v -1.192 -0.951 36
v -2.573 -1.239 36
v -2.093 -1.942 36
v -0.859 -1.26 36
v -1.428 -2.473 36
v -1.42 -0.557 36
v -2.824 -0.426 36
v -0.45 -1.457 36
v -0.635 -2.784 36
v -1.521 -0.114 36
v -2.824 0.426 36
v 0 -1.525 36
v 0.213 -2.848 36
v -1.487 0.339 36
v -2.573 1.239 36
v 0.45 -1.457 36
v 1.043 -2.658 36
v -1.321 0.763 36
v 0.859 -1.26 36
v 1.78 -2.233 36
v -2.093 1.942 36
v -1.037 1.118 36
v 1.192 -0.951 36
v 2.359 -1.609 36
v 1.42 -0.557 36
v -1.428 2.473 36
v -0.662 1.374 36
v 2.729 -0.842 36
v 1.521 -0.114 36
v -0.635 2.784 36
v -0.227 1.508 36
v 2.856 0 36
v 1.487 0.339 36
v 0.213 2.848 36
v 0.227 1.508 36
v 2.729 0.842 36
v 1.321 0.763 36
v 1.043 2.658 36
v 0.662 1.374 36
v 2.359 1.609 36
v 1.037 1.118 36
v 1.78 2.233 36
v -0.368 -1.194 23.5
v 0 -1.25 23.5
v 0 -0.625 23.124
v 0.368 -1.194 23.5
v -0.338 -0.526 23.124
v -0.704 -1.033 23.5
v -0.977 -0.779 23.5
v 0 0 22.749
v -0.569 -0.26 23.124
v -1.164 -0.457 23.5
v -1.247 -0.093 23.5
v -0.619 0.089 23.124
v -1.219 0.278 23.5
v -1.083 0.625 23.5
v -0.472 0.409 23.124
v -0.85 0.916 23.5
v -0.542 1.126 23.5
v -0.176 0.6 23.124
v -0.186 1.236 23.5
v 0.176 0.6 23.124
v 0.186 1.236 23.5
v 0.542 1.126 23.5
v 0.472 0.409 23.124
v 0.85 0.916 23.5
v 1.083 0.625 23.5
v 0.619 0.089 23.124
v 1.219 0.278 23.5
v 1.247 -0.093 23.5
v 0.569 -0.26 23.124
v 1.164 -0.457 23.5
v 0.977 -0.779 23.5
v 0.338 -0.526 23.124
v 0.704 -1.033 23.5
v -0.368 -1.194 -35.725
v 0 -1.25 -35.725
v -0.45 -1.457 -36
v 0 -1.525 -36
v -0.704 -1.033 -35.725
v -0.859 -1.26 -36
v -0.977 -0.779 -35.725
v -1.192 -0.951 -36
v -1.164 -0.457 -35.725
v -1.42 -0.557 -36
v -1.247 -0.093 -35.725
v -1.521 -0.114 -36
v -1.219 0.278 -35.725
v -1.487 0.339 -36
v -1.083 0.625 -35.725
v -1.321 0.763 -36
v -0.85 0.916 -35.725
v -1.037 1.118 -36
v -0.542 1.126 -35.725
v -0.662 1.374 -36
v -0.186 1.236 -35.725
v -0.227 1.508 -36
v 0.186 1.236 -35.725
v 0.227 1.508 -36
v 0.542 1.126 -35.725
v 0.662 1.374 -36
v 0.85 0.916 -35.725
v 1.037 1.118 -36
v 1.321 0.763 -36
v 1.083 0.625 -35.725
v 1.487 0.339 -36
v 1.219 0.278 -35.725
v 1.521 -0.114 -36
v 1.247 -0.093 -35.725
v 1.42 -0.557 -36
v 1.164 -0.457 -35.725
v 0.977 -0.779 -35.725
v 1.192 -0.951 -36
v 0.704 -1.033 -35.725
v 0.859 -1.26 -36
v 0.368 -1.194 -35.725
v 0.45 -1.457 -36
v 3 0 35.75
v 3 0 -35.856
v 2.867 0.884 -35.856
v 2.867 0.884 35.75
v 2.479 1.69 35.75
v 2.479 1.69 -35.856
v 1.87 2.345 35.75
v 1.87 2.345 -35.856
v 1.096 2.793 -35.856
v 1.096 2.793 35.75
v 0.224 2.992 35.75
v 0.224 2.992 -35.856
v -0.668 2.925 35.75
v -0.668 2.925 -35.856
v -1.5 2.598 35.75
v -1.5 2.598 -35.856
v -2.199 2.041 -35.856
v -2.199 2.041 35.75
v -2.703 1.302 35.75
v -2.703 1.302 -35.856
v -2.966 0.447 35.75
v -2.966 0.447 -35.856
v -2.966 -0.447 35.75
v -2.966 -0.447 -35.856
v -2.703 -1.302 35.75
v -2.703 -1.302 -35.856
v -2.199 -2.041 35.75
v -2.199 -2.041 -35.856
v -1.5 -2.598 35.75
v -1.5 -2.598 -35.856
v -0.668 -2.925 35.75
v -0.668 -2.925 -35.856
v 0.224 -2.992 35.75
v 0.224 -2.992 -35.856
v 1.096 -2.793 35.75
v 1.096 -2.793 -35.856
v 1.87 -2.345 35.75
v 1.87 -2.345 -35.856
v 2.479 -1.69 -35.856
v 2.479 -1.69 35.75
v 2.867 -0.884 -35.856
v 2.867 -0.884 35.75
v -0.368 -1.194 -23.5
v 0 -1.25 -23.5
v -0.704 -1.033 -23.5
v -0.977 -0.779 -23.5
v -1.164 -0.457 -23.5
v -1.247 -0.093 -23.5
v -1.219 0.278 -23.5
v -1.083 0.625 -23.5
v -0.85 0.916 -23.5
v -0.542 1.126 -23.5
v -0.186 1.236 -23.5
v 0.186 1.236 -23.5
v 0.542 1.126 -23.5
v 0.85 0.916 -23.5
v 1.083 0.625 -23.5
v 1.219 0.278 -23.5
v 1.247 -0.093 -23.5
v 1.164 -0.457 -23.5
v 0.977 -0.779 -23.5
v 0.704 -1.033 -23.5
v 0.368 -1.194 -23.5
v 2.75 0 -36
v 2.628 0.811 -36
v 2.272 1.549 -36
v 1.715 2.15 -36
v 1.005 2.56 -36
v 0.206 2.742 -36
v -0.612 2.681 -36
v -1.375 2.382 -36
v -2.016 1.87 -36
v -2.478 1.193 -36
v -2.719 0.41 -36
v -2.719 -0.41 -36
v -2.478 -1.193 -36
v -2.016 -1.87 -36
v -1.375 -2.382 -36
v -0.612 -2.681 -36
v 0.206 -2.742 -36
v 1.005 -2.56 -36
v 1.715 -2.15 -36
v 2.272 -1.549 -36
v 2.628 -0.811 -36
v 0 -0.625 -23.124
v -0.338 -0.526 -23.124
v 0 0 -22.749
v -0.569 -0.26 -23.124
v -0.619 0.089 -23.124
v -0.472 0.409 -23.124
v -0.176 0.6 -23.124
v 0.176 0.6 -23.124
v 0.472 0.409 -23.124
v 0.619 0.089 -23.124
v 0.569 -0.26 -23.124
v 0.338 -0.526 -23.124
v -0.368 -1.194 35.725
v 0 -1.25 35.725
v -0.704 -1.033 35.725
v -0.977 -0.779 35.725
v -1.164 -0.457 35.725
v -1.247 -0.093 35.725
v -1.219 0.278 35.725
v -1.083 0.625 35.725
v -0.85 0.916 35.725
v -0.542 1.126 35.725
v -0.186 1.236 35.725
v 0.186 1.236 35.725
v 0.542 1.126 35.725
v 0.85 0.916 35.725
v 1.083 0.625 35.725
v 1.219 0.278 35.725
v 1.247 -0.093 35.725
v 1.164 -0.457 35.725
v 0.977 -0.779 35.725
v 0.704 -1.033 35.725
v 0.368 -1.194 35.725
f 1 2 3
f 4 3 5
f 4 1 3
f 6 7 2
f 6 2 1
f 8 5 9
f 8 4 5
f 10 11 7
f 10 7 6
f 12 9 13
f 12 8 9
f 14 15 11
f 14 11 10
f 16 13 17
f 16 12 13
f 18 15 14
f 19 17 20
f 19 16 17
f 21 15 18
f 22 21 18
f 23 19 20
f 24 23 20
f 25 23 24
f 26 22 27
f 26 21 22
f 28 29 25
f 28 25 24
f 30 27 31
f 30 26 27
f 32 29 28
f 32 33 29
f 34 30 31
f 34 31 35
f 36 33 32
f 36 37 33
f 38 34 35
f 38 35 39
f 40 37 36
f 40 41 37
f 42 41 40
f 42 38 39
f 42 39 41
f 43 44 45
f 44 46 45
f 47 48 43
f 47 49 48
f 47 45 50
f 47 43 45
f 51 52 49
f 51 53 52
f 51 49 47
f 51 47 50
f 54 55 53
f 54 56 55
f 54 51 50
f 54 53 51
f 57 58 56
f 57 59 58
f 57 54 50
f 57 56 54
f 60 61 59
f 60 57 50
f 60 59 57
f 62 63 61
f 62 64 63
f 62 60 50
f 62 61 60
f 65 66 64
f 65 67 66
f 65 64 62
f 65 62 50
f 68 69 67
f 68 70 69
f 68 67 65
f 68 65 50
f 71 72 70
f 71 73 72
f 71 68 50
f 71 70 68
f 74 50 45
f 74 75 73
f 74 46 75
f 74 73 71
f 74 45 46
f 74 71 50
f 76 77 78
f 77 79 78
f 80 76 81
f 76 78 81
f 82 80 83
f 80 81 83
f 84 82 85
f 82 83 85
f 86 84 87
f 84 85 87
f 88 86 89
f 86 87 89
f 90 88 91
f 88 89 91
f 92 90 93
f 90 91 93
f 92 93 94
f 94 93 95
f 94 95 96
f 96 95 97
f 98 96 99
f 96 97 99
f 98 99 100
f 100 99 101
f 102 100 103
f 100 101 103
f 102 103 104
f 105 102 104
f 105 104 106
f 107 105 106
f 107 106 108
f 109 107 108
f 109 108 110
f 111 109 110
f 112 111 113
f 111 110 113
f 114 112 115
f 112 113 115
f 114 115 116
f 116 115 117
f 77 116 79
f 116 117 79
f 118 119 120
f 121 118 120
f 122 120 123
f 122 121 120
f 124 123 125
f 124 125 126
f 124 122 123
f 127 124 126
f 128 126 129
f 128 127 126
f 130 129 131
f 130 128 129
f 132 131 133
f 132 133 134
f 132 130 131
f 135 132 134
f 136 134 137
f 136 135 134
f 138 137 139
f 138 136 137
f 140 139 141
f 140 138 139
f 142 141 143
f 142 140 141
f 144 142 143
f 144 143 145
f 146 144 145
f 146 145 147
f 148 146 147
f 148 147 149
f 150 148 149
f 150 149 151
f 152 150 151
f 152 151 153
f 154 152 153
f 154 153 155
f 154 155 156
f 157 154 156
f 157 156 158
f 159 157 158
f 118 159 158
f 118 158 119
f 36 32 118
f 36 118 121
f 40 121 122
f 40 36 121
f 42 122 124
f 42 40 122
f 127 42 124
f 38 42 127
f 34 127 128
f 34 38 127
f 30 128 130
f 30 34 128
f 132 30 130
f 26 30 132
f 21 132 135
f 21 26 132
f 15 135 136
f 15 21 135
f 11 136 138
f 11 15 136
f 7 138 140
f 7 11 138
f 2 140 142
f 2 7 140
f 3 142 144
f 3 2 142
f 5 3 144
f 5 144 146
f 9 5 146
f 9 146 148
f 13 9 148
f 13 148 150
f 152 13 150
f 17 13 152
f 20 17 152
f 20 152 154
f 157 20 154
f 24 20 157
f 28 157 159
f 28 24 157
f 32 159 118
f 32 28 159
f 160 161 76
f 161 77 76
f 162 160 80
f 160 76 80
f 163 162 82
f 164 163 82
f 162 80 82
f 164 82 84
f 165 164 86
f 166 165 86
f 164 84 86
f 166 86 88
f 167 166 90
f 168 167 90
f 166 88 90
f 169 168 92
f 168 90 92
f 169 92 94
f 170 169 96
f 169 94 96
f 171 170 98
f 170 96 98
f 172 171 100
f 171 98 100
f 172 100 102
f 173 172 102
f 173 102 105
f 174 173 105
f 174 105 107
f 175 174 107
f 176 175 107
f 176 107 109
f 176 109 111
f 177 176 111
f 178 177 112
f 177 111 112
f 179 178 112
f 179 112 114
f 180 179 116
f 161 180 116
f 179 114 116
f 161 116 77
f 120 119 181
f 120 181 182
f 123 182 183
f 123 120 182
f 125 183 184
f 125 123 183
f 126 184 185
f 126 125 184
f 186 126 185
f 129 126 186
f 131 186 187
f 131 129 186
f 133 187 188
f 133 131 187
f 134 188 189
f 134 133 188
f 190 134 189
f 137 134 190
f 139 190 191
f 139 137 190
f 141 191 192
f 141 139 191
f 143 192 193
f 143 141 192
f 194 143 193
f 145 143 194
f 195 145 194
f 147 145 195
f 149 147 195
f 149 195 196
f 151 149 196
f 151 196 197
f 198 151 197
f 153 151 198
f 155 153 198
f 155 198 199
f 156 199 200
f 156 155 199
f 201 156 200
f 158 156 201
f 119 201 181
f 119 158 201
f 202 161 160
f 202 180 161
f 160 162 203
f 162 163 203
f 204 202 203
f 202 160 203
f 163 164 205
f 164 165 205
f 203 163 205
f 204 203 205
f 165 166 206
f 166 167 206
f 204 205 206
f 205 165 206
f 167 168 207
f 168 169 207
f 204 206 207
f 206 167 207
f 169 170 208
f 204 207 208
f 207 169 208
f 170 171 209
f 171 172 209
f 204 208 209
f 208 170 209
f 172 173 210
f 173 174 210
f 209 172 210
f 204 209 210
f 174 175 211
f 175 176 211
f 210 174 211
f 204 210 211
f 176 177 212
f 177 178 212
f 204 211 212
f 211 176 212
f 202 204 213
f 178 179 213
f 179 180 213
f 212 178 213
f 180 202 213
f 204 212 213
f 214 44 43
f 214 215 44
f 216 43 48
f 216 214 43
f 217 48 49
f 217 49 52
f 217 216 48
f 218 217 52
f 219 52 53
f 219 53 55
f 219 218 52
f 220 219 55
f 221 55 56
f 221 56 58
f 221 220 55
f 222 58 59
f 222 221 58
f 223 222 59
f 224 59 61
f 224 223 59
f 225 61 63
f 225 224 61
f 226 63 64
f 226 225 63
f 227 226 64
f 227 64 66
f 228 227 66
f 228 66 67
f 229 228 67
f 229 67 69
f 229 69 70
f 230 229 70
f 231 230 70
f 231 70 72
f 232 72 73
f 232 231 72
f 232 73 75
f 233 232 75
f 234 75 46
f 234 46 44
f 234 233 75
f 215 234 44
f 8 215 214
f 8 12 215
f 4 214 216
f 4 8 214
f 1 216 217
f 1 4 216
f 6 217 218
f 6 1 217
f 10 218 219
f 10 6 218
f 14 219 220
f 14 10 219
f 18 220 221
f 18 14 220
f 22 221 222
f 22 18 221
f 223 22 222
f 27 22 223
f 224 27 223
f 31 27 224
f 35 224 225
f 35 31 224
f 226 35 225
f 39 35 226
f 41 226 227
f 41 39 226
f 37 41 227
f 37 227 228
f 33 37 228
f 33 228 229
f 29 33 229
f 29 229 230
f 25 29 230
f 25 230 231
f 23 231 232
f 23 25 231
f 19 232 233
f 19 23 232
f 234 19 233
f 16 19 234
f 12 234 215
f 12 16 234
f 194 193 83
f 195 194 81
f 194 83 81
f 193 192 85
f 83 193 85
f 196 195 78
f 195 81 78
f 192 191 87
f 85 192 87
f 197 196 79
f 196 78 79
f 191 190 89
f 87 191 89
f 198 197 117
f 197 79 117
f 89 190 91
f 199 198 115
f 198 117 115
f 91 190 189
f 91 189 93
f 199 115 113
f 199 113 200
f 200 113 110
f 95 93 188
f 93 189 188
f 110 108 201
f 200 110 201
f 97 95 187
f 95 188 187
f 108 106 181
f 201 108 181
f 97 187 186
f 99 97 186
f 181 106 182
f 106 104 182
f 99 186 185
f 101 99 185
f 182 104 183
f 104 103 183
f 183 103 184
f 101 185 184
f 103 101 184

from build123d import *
from OCP.BRepFilletAPI import BRepFilletAPI_MakeChamfer

# Parameters (mm, degrees)
SKETCH_1_R      = 3
EXTRUDE_1_DEPTH = 36
CHAMFER_1_SIZE  = 0.25
CHAMFER_1_SIZE2 = 0.144337567


with BuildPart() as part:
    # ｽｹｯﾁ1 → ﾎﾞｽ - 押し出し1 (new, symmetric)
    with BuildSketch(Plane.XY):
        Circle(SKETCH_1_R)
    extrude(amount=EXTRUDE_1_DEPTH, both=True)

    # 面取り1: one chamfer whose edges measure the first distance from different faces: ONE call of the kernel's chamfer builder (chamfer() names one face for all edges)
    chamfer_1_edges_1 = [part.edges().sort_by_distance(p)[0] for p in [
        (-3, 0, -36),
    ]]
    chamfer_1_side_1 = [part.faces().sort_by_distance(p)[0] for p in [
        (0, 0, -36),
    ]]
    chamfer_1_edges_2 = [part.edges().sort_by_distance(p)[0] for p in [
        (-3, 0, 36),
    ]]
    chamfer_1_side_2 = [part.faces().sort_by_distance(p)[0] for p in [
        (-3, 0, 0),
    ]]
    chamfer_1 = BRepFilletAPI_MakeChamfer(part.part.solid().wrapped)
    for e in chamfer_1_edges_1:
        chamfer_1.Add(CHAMFER_1_SIZE, CHAMFER_1_SIZE2, e.wrapped, chamfer_1_side_1[0].wrapped)  # the first distance lies on this face
    for e in chamfer_1_edges_2:
        chamfer_1.Add(CHAMFER_1_SIZE, CHAMFER_1_SIZE2, e.wrapped, chamfer_1_side_2[0].wrapped)  # the first distance lies on this face
    add(Compound.cast(chamfer_1.Shape()), mode=Mode.REPLACE)

    # ｽｹｯﾁ3 → M3x0.5 ねじ穴1 (revolve, cut)
    with BuildSketch(Plane(origin=(0, 0, 36), x_dir=(0, -1, 0), z_dir=(1, 0, 0))):
        Polygon((0, 0), (0, 13.251075774), (1.25, 12.5), (1.25, 0.275), (1.525, 0), align=None)
    m3x0_5_1 = revolve(axis=Axis((0, 0, 42.35), (0, 0, -1)), mode=Mode.SUBTRACT)

    # ﾐﾗｰ1: M3x0.5 ねじ穴1 across plane
    add(m3x0_5_1.mirror(Plane.XY), mode=Mode.SUBTRACT)


solid = part.part
